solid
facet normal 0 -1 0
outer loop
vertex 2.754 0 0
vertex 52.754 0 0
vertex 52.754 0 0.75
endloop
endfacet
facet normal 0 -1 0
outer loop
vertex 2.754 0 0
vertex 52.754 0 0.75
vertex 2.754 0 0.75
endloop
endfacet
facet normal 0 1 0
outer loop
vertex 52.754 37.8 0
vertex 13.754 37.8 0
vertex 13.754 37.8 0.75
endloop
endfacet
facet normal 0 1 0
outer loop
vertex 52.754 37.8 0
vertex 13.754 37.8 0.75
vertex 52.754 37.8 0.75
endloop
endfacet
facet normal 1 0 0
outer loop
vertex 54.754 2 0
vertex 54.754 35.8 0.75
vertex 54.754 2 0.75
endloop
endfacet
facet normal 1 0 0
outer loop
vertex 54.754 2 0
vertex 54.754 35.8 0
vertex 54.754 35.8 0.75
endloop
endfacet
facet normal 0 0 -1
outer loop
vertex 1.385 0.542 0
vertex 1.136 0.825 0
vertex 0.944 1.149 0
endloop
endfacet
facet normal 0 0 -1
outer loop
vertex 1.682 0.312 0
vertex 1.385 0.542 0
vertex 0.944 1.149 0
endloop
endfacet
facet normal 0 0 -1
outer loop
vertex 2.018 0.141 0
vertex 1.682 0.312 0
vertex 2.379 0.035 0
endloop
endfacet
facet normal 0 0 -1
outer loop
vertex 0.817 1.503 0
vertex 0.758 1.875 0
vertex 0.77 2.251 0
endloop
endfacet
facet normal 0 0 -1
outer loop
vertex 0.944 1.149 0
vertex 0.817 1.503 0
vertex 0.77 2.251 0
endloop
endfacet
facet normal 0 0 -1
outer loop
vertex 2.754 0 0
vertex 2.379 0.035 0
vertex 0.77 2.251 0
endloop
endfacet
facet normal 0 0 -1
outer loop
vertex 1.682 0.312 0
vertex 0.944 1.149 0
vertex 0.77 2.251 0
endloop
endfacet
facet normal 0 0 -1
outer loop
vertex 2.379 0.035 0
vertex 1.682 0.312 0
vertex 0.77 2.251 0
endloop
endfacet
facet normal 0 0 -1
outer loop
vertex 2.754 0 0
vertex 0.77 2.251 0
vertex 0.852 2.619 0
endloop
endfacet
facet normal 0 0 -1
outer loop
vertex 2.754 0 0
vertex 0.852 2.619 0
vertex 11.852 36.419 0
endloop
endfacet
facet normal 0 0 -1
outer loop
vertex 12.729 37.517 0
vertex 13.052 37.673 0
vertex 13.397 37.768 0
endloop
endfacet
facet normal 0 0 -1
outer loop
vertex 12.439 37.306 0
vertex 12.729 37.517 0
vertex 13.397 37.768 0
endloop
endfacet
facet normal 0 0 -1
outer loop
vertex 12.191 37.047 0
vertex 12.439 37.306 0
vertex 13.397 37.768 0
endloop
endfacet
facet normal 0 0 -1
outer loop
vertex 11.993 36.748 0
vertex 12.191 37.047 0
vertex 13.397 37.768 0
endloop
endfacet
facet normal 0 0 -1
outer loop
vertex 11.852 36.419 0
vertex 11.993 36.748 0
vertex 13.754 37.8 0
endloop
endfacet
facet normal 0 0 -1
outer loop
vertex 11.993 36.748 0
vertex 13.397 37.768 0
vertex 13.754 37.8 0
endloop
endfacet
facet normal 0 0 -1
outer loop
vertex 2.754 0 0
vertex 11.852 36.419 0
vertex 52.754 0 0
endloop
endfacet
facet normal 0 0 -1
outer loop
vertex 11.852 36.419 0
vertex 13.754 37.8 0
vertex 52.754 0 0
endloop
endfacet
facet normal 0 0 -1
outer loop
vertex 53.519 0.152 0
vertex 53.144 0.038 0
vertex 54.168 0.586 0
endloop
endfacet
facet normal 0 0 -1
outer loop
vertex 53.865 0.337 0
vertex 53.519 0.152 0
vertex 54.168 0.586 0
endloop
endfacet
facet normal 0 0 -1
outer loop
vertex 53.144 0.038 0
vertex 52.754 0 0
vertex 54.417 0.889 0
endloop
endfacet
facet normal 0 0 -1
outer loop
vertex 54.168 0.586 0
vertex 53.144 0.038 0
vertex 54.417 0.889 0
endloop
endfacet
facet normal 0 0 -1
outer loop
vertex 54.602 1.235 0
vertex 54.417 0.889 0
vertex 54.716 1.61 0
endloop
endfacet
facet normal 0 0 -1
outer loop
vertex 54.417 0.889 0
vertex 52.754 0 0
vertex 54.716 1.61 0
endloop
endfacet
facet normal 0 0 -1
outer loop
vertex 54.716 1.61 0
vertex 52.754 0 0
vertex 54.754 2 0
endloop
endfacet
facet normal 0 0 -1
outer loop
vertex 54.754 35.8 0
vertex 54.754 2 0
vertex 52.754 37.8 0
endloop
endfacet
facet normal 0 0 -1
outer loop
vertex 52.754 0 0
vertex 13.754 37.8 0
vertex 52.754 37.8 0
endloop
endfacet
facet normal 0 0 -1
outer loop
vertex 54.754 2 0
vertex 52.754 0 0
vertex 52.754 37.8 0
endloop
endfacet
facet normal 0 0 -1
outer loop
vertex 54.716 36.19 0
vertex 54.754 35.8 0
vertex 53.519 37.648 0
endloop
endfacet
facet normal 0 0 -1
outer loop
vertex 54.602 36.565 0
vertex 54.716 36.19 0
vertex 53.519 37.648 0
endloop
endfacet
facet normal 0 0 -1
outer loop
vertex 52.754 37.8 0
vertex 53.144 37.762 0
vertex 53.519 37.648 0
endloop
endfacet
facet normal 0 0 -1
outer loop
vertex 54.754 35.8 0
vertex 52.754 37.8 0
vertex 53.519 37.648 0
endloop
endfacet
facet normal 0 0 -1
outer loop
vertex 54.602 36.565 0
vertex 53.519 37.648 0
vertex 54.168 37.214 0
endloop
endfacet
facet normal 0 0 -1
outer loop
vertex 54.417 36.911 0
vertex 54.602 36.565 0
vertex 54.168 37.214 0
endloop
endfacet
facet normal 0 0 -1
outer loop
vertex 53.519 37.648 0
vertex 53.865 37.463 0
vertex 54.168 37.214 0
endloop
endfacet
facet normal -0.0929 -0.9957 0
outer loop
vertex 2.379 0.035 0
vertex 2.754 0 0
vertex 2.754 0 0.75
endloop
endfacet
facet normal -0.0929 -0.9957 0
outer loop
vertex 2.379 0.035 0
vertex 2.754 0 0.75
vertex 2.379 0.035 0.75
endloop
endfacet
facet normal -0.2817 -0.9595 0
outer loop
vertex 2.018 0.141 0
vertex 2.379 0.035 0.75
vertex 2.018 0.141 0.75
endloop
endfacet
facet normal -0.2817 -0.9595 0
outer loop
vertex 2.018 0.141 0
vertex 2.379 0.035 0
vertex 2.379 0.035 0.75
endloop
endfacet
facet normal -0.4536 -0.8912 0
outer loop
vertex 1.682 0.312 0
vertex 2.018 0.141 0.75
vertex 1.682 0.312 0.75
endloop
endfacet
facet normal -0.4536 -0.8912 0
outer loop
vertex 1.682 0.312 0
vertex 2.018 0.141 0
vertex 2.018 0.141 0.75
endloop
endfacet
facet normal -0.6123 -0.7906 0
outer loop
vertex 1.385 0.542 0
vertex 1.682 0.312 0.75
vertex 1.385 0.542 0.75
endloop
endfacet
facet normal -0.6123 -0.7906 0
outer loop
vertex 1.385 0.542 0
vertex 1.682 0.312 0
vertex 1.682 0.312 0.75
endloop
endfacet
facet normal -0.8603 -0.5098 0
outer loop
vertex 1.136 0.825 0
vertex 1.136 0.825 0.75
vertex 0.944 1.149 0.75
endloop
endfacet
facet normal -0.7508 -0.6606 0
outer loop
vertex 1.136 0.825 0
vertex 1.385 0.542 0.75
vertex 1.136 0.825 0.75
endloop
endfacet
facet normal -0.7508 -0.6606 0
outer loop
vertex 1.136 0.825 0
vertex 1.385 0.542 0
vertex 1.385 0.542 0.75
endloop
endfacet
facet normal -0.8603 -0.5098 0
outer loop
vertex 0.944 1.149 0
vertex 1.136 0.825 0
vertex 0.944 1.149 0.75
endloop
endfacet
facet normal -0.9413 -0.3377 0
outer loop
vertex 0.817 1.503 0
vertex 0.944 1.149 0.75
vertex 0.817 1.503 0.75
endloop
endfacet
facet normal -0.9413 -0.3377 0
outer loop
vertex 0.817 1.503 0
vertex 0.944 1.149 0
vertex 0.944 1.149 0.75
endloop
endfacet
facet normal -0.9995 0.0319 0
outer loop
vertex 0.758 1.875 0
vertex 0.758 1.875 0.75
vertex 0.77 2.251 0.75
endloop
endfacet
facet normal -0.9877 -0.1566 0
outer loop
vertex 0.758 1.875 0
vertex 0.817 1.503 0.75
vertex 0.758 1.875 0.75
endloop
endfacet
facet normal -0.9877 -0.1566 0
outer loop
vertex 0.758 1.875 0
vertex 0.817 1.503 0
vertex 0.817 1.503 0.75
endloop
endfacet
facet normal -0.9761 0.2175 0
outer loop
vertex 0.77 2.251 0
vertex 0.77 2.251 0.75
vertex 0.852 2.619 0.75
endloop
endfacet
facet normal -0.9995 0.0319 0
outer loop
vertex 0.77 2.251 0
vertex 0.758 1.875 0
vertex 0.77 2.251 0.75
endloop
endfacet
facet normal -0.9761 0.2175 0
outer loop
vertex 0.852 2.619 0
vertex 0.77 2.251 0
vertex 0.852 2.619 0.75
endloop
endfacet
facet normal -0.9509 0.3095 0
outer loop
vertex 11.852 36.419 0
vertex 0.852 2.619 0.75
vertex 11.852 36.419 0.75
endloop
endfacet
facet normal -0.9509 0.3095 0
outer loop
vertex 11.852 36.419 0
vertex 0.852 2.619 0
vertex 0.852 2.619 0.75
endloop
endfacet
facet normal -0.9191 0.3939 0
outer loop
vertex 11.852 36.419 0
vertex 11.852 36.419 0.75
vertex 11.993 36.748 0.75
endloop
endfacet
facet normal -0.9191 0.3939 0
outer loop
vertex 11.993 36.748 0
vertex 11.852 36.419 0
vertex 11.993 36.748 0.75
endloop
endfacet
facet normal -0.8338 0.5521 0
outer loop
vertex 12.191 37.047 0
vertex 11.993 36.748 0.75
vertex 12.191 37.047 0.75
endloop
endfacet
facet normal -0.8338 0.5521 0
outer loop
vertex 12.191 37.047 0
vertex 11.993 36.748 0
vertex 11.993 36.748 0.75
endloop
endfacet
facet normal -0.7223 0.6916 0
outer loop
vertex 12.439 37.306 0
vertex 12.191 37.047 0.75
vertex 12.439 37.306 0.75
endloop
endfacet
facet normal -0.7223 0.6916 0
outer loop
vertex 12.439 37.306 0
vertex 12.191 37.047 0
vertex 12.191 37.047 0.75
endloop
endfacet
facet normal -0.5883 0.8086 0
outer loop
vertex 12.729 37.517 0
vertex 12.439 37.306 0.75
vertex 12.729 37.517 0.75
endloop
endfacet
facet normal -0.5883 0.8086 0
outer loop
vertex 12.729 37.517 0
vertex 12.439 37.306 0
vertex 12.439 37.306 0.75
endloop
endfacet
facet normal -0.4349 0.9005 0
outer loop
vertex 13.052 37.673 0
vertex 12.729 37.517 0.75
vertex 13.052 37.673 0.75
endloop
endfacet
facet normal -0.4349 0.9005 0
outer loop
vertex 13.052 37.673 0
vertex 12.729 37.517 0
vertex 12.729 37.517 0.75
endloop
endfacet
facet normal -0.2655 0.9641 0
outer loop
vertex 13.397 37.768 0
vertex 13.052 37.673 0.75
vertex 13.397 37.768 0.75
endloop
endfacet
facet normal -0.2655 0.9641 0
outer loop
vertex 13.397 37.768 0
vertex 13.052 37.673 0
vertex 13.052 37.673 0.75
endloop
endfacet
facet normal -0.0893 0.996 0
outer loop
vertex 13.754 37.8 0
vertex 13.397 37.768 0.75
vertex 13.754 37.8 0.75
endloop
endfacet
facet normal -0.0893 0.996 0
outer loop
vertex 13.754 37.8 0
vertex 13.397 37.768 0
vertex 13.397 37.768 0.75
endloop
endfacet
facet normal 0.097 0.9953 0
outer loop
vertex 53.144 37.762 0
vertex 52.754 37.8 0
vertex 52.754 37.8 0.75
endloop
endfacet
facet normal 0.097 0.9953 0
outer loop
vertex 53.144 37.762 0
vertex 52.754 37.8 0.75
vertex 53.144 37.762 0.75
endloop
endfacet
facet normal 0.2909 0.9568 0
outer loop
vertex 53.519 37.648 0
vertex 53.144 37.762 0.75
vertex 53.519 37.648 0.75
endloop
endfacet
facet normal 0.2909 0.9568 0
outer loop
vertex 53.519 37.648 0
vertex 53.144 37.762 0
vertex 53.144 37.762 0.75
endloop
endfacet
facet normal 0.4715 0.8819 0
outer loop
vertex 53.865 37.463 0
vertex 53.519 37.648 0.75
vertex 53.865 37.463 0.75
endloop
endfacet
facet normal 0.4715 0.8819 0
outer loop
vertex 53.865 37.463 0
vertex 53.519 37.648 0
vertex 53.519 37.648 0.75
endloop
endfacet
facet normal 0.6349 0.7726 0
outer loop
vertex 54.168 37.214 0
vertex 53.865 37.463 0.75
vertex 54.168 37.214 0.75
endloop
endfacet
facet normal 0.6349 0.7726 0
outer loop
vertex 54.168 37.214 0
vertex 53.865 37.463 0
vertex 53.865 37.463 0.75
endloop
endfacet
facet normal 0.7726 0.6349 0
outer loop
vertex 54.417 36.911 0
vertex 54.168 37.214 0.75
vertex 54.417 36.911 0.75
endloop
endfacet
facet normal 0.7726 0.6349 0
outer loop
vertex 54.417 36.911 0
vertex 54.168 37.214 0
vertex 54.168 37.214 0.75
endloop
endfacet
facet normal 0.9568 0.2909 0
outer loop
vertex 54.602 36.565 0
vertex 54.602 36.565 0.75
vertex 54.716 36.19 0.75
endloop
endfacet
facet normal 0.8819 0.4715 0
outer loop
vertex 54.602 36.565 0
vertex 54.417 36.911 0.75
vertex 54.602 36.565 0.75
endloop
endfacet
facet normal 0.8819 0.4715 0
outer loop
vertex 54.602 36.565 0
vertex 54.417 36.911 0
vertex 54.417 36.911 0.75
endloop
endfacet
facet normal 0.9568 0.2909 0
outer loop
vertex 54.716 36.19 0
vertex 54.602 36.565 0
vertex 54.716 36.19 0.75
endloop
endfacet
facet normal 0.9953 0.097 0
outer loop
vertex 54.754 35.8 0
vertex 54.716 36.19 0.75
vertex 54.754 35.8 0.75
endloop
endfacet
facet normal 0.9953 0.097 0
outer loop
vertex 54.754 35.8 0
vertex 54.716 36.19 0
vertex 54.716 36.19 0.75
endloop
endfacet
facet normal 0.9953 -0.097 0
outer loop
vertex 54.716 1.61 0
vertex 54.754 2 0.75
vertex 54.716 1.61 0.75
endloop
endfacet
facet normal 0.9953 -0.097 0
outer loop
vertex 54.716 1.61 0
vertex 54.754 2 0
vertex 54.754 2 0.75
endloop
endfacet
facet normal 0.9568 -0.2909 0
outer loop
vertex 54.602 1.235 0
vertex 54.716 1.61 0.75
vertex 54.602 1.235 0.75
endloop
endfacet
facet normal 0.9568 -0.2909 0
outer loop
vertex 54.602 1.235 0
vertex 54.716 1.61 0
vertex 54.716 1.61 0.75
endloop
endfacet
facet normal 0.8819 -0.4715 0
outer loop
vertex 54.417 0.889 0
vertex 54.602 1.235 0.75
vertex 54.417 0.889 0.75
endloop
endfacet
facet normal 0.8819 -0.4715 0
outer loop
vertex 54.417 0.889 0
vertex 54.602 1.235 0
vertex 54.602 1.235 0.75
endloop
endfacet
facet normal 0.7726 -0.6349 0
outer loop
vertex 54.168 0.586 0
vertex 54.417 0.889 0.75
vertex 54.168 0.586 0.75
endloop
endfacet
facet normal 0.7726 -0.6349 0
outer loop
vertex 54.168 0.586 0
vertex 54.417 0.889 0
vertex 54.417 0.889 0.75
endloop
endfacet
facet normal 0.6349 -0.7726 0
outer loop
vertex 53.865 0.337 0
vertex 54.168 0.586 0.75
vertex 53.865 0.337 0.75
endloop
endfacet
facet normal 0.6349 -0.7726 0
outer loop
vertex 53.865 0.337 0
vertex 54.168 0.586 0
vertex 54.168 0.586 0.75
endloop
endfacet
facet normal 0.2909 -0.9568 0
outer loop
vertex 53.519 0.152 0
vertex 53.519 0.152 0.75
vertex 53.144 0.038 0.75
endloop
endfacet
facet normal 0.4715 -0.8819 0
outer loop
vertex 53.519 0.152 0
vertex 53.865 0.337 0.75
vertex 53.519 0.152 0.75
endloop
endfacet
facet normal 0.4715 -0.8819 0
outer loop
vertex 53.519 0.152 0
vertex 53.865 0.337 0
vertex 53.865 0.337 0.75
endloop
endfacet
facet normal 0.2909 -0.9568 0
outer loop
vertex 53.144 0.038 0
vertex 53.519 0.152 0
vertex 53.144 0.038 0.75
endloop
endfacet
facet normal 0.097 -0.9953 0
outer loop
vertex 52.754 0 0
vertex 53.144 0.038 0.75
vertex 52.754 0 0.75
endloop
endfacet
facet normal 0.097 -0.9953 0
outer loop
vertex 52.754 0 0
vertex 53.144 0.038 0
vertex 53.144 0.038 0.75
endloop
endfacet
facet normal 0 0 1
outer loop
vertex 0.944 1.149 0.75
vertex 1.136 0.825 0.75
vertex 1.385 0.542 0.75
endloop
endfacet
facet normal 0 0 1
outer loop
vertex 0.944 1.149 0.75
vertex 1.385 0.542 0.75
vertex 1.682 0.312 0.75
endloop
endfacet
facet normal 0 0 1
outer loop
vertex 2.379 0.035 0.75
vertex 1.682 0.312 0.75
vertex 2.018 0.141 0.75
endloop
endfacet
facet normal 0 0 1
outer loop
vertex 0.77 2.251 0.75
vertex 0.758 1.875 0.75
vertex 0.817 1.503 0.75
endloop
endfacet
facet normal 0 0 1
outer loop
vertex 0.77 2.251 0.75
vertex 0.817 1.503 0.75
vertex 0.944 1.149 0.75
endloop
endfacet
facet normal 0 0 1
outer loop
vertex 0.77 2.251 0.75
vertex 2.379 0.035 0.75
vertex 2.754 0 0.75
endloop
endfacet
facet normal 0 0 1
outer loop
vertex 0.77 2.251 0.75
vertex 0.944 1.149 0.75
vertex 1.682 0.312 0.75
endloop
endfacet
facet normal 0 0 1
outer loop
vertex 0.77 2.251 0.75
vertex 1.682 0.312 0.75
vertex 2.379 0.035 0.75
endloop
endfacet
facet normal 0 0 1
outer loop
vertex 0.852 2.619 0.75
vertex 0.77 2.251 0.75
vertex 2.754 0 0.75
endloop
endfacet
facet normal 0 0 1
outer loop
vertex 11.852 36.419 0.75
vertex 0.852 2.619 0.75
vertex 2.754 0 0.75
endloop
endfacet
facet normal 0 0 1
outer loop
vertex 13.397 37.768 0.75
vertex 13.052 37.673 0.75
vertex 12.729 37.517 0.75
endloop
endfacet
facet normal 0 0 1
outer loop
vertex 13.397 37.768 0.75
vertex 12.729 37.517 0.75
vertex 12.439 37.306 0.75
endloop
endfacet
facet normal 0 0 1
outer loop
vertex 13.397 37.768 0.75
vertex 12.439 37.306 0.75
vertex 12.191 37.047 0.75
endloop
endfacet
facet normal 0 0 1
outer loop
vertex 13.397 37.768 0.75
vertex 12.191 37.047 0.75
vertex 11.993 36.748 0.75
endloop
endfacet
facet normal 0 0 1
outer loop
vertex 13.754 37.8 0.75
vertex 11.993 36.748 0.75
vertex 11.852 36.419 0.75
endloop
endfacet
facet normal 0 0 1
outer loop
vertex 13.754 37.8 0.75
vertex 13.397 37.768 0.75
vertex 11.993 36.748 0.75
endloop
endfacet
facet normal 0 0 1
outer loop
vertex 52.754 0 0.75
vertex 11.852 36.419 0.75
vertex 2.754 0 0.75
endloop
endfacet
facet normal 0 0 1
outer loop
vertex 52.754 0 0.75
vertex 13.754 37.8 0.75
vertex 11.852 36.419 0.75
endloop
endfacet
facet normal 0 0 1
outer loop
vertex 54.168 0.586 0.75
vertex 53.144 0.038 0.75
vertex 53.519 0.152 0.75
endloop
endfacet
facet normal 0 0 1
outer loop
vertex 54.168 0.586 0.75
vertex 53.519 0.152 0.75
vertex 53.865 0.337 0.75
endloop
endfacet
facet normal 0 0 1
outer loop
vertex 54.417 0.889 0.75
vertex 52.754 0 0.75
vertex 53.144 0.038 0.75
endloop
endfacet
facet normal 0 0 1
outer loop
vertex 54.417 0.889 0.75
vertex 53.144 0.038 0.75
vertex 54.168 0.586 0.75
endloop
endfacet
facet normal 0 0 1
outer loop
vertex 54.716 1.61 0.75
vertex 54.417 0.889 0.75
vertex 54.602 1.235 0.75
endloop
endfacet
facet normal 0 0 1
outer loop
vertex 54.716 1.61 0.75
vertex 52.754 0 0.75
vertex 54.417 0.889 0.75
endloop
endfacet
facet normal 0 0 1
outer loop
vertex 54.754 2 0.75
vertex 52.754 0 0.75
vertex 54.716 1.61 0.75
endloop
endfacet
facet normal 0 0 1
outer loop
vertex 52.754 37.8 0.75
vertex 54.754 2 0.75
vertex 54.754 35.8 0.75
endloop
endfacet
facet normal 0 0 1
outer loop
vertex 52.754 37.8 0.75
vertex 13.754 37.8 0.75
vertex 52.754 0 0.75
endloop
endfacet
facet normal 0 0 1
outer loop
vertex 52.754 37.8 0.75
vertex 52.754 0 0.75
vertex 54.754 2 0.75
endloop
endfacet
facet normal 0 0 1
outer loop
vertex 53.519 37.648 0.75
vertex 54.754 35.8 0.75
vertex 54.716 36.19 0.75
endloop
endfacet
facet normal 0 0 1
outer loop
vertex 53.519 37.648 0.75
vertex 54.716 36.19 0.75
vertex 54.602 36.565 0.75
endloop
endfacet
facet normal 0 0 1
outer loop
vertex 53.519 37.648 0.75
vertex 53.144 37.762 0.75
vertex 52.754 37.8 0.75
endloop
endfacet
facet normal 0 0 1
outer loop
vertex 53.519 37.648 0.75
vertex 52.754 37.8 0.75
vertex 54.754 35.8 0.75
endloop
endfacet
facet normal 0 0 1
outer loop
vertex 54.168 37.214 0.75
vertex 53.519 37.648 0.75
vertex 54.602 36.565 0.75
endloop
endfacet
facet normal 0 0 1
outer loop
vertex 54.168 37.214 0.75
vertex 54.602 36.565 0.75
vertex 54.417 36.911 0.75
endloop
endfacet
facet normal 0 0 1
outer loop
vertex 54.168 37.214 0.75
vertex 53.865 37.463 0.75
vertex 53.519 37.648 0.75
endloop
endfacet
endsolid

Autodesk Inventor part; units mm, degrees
ref_plane "YZ Plane" through (0, 0, 0) normal (1, 0, 0) x (0, 1, 0)
ref_plane "XZ Plane" through (0, 0, 0) normal (0, 1, 0) x (-1, 0, 0)
ref_plane "XY Plane" through (0, 0, 0) normal (0, 0, 1) x (1, 0, 0)
sketch "Boceto1" plane through (0, 0, 0) normal (0, 0, 1) x (1, 0, 0)
  line L0 (0.8523, 2.6189) -> (11.8523, 36.4189)
  line L1 (13.7541, 37.8) -> (52.7541, 37.8)
  line L2 (54.7541, 35.8) -> (54.7541, 2)
  line L3 (52.7541, 0) -> (2.7541, 0)
  arc A0 (13.7541, 37.8) -> (11.8523, 36.4189) centre (13.7541, 35.8) ccw
  arc A1 (54.7541, 35.8) -> (52.7541, 37.8) centre (52.7541, 35.8) ccw
  arc A2 (52.7541, 0) -> (54.7541, 2) centre (52.7541, 2) ccw
  arc A3 (0.8523, 2.6189) -> (2.7541, 0) centre (2.7541, 2) ccw
  point P0 (0, 0)
  point P1 (12.3018, 37.8)
  point P2 (54.7541, 37.8)
  point P3 (54.7541, 0)
  dimension "d3" = 2
  dimension "d6" = 33.8
  dimension "d7" = 39
  dimension "d8" = 50
extrude "Extrusión1" add sketch "Boceto1" along normal blind 0.75
properties part number "VentanaLateralDelantera"
